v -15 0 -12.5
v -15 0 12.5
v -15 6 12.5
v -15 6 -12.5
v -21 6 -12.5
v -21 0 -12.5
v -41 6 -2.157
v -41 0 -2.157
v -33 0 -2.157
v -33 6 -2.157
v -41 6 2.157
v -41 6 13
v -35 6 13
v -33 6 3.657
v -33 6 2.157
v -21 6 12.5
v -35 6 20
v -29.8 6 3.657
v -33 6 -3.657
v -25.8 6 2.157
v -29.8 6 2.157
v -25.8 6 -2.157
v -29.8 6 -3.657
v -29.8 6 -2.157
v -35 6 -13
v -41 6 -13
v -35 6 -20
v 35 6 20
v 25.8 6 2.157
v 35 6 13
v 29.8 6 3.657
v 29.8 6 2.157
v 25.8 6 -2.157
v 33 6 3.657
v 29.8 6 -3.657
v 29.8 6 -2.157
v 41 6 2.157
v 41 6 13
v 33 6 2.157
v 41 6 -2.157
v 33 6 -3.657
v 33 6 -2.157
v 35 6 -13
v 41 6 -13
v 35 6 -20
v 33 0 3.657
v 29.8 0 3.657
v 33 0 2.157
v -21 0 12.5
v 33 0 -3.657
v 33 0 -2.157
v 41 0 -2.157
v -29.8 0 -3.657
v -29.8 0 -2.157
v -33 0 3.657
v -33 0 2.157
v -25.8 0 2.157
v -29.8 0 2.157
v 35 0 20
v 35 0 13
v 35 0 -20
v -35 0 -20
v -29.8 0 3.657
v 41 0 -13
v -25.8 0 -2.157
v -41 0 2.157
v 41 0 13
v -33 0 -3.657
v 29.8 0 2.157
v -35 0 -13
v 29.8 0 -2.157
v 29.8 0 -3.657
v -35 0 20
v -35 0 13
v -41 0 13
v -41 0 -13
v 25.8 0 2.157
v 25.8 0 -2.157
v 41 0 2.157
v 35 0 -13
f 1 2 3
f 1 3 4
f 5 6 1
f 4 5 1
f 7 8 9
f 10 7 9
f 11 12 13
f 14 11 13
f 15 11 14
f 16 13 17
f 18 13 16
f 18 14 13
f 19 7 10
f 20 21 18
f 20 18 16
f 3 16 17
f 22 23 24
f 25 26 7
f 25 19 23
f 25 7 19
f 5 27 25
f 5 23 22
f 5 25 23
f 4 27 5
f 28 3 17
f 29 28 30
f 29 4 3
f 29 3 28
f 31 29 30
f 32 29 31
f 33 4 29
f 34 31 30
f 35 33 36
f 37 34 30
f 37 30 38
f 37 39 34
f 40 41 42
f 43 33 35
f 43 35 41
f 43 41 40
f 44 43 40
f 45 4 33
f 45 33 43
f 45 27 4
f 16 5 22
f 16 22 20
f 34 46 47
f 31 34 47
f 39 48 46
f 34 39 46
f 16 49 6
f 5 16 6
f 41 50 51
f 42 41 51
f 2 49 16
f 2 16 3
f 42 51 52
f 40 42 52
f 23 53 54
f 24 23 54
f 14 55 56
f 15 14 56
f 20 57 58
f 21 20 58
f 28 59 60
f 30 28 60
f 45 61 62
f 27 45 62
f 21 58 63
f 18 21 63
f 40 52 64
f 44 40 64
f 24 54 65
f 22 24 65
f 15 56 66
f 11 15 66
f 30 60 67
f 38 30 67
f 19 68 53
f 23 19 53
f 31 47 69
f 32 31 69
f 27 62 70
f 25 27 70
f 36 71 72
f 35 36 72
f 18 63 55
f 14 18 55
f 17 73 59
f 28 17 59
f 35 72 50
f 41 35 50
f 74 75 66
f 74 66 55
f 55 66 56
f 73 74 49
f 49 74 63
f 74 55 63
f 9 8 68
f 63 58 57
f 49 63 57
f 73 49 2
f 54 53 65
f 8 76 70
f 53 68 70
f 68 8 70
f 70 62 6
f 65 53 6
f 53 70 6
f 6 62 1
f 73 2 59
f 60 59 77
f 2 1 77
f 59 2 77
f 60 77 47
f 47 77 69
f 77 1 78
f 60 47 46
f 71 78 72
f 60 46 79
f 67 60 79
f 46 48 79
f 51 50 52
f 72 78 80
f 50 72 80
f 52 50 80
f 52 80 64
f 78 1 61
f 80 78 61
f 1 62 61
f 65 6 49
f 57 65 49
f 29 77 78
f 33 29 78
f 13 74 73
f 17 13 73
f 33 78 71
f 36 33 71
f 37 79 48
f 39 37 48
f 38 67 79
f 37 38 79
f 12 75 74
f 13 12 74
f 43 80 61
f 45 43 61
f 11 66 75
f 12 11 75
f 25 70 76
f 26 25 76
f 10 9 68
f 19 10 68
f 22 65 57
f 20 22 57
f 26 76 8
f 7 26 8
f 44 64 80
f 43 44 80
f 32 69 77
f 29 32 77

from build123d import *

# Parameters (mm, degrees)
SKETCH1_W           = 6
SKETCH1_H           = 25
BOSS_EXTRUDE1_DEPTH = 6


with BuildPart() as part:
    # Sketch1 → Boss-Extrude1 (new body)
    with BuildSketch(Plane(origin=(0, 0, 0), x_dir=(1, 0, 0), z_dir=(0, 1, 0))):
        Polygon((35, 20), (-35, 20), (-35, 13), (-41, 13), (-41, 2.156563888), (-33, 2.156563888), (-33, 3.656563888), (-29.8, 3.656563888), (-29.8, 2.156563888), (-25.8, 2.156563888), (-25.8, 1.843436112), (-25.8, -1.843436112), (-25.8, -2.156563888), (-29.8, -2.156563888), (-29.8, -3.656563888), (-33, -3.656563888), (-33, -2.156563888), (-41, -2.156563888), (-41, -13), (-35, -13), (-35, -20), (35, -20), (35, -13), (41, -13), (41, -2.156563888), (33, -2.156563888), (33, -3.656563888), (29.8, -3.656563888), (29.8, -2.156563888), (25.8, -2.156563888), (25.8, -1.843436112), (25.8, 1.843436112), (25.8, 2.156563888), (29.8, 2.156563888), (29.8, 3.656563888), (33, 3.656563888), (33, 2.156563888), (41, 2.156563888), (41, 13), (35, 13), align=None)
        with Locations((-18, 0)):
            Rectangle(SKETCH1_W, SKETCH1_H, mode=Mode.SUBTRACT)
    extrude(amount=BOSS_EXTRUDE1_DEPTH)


solid = part.part
